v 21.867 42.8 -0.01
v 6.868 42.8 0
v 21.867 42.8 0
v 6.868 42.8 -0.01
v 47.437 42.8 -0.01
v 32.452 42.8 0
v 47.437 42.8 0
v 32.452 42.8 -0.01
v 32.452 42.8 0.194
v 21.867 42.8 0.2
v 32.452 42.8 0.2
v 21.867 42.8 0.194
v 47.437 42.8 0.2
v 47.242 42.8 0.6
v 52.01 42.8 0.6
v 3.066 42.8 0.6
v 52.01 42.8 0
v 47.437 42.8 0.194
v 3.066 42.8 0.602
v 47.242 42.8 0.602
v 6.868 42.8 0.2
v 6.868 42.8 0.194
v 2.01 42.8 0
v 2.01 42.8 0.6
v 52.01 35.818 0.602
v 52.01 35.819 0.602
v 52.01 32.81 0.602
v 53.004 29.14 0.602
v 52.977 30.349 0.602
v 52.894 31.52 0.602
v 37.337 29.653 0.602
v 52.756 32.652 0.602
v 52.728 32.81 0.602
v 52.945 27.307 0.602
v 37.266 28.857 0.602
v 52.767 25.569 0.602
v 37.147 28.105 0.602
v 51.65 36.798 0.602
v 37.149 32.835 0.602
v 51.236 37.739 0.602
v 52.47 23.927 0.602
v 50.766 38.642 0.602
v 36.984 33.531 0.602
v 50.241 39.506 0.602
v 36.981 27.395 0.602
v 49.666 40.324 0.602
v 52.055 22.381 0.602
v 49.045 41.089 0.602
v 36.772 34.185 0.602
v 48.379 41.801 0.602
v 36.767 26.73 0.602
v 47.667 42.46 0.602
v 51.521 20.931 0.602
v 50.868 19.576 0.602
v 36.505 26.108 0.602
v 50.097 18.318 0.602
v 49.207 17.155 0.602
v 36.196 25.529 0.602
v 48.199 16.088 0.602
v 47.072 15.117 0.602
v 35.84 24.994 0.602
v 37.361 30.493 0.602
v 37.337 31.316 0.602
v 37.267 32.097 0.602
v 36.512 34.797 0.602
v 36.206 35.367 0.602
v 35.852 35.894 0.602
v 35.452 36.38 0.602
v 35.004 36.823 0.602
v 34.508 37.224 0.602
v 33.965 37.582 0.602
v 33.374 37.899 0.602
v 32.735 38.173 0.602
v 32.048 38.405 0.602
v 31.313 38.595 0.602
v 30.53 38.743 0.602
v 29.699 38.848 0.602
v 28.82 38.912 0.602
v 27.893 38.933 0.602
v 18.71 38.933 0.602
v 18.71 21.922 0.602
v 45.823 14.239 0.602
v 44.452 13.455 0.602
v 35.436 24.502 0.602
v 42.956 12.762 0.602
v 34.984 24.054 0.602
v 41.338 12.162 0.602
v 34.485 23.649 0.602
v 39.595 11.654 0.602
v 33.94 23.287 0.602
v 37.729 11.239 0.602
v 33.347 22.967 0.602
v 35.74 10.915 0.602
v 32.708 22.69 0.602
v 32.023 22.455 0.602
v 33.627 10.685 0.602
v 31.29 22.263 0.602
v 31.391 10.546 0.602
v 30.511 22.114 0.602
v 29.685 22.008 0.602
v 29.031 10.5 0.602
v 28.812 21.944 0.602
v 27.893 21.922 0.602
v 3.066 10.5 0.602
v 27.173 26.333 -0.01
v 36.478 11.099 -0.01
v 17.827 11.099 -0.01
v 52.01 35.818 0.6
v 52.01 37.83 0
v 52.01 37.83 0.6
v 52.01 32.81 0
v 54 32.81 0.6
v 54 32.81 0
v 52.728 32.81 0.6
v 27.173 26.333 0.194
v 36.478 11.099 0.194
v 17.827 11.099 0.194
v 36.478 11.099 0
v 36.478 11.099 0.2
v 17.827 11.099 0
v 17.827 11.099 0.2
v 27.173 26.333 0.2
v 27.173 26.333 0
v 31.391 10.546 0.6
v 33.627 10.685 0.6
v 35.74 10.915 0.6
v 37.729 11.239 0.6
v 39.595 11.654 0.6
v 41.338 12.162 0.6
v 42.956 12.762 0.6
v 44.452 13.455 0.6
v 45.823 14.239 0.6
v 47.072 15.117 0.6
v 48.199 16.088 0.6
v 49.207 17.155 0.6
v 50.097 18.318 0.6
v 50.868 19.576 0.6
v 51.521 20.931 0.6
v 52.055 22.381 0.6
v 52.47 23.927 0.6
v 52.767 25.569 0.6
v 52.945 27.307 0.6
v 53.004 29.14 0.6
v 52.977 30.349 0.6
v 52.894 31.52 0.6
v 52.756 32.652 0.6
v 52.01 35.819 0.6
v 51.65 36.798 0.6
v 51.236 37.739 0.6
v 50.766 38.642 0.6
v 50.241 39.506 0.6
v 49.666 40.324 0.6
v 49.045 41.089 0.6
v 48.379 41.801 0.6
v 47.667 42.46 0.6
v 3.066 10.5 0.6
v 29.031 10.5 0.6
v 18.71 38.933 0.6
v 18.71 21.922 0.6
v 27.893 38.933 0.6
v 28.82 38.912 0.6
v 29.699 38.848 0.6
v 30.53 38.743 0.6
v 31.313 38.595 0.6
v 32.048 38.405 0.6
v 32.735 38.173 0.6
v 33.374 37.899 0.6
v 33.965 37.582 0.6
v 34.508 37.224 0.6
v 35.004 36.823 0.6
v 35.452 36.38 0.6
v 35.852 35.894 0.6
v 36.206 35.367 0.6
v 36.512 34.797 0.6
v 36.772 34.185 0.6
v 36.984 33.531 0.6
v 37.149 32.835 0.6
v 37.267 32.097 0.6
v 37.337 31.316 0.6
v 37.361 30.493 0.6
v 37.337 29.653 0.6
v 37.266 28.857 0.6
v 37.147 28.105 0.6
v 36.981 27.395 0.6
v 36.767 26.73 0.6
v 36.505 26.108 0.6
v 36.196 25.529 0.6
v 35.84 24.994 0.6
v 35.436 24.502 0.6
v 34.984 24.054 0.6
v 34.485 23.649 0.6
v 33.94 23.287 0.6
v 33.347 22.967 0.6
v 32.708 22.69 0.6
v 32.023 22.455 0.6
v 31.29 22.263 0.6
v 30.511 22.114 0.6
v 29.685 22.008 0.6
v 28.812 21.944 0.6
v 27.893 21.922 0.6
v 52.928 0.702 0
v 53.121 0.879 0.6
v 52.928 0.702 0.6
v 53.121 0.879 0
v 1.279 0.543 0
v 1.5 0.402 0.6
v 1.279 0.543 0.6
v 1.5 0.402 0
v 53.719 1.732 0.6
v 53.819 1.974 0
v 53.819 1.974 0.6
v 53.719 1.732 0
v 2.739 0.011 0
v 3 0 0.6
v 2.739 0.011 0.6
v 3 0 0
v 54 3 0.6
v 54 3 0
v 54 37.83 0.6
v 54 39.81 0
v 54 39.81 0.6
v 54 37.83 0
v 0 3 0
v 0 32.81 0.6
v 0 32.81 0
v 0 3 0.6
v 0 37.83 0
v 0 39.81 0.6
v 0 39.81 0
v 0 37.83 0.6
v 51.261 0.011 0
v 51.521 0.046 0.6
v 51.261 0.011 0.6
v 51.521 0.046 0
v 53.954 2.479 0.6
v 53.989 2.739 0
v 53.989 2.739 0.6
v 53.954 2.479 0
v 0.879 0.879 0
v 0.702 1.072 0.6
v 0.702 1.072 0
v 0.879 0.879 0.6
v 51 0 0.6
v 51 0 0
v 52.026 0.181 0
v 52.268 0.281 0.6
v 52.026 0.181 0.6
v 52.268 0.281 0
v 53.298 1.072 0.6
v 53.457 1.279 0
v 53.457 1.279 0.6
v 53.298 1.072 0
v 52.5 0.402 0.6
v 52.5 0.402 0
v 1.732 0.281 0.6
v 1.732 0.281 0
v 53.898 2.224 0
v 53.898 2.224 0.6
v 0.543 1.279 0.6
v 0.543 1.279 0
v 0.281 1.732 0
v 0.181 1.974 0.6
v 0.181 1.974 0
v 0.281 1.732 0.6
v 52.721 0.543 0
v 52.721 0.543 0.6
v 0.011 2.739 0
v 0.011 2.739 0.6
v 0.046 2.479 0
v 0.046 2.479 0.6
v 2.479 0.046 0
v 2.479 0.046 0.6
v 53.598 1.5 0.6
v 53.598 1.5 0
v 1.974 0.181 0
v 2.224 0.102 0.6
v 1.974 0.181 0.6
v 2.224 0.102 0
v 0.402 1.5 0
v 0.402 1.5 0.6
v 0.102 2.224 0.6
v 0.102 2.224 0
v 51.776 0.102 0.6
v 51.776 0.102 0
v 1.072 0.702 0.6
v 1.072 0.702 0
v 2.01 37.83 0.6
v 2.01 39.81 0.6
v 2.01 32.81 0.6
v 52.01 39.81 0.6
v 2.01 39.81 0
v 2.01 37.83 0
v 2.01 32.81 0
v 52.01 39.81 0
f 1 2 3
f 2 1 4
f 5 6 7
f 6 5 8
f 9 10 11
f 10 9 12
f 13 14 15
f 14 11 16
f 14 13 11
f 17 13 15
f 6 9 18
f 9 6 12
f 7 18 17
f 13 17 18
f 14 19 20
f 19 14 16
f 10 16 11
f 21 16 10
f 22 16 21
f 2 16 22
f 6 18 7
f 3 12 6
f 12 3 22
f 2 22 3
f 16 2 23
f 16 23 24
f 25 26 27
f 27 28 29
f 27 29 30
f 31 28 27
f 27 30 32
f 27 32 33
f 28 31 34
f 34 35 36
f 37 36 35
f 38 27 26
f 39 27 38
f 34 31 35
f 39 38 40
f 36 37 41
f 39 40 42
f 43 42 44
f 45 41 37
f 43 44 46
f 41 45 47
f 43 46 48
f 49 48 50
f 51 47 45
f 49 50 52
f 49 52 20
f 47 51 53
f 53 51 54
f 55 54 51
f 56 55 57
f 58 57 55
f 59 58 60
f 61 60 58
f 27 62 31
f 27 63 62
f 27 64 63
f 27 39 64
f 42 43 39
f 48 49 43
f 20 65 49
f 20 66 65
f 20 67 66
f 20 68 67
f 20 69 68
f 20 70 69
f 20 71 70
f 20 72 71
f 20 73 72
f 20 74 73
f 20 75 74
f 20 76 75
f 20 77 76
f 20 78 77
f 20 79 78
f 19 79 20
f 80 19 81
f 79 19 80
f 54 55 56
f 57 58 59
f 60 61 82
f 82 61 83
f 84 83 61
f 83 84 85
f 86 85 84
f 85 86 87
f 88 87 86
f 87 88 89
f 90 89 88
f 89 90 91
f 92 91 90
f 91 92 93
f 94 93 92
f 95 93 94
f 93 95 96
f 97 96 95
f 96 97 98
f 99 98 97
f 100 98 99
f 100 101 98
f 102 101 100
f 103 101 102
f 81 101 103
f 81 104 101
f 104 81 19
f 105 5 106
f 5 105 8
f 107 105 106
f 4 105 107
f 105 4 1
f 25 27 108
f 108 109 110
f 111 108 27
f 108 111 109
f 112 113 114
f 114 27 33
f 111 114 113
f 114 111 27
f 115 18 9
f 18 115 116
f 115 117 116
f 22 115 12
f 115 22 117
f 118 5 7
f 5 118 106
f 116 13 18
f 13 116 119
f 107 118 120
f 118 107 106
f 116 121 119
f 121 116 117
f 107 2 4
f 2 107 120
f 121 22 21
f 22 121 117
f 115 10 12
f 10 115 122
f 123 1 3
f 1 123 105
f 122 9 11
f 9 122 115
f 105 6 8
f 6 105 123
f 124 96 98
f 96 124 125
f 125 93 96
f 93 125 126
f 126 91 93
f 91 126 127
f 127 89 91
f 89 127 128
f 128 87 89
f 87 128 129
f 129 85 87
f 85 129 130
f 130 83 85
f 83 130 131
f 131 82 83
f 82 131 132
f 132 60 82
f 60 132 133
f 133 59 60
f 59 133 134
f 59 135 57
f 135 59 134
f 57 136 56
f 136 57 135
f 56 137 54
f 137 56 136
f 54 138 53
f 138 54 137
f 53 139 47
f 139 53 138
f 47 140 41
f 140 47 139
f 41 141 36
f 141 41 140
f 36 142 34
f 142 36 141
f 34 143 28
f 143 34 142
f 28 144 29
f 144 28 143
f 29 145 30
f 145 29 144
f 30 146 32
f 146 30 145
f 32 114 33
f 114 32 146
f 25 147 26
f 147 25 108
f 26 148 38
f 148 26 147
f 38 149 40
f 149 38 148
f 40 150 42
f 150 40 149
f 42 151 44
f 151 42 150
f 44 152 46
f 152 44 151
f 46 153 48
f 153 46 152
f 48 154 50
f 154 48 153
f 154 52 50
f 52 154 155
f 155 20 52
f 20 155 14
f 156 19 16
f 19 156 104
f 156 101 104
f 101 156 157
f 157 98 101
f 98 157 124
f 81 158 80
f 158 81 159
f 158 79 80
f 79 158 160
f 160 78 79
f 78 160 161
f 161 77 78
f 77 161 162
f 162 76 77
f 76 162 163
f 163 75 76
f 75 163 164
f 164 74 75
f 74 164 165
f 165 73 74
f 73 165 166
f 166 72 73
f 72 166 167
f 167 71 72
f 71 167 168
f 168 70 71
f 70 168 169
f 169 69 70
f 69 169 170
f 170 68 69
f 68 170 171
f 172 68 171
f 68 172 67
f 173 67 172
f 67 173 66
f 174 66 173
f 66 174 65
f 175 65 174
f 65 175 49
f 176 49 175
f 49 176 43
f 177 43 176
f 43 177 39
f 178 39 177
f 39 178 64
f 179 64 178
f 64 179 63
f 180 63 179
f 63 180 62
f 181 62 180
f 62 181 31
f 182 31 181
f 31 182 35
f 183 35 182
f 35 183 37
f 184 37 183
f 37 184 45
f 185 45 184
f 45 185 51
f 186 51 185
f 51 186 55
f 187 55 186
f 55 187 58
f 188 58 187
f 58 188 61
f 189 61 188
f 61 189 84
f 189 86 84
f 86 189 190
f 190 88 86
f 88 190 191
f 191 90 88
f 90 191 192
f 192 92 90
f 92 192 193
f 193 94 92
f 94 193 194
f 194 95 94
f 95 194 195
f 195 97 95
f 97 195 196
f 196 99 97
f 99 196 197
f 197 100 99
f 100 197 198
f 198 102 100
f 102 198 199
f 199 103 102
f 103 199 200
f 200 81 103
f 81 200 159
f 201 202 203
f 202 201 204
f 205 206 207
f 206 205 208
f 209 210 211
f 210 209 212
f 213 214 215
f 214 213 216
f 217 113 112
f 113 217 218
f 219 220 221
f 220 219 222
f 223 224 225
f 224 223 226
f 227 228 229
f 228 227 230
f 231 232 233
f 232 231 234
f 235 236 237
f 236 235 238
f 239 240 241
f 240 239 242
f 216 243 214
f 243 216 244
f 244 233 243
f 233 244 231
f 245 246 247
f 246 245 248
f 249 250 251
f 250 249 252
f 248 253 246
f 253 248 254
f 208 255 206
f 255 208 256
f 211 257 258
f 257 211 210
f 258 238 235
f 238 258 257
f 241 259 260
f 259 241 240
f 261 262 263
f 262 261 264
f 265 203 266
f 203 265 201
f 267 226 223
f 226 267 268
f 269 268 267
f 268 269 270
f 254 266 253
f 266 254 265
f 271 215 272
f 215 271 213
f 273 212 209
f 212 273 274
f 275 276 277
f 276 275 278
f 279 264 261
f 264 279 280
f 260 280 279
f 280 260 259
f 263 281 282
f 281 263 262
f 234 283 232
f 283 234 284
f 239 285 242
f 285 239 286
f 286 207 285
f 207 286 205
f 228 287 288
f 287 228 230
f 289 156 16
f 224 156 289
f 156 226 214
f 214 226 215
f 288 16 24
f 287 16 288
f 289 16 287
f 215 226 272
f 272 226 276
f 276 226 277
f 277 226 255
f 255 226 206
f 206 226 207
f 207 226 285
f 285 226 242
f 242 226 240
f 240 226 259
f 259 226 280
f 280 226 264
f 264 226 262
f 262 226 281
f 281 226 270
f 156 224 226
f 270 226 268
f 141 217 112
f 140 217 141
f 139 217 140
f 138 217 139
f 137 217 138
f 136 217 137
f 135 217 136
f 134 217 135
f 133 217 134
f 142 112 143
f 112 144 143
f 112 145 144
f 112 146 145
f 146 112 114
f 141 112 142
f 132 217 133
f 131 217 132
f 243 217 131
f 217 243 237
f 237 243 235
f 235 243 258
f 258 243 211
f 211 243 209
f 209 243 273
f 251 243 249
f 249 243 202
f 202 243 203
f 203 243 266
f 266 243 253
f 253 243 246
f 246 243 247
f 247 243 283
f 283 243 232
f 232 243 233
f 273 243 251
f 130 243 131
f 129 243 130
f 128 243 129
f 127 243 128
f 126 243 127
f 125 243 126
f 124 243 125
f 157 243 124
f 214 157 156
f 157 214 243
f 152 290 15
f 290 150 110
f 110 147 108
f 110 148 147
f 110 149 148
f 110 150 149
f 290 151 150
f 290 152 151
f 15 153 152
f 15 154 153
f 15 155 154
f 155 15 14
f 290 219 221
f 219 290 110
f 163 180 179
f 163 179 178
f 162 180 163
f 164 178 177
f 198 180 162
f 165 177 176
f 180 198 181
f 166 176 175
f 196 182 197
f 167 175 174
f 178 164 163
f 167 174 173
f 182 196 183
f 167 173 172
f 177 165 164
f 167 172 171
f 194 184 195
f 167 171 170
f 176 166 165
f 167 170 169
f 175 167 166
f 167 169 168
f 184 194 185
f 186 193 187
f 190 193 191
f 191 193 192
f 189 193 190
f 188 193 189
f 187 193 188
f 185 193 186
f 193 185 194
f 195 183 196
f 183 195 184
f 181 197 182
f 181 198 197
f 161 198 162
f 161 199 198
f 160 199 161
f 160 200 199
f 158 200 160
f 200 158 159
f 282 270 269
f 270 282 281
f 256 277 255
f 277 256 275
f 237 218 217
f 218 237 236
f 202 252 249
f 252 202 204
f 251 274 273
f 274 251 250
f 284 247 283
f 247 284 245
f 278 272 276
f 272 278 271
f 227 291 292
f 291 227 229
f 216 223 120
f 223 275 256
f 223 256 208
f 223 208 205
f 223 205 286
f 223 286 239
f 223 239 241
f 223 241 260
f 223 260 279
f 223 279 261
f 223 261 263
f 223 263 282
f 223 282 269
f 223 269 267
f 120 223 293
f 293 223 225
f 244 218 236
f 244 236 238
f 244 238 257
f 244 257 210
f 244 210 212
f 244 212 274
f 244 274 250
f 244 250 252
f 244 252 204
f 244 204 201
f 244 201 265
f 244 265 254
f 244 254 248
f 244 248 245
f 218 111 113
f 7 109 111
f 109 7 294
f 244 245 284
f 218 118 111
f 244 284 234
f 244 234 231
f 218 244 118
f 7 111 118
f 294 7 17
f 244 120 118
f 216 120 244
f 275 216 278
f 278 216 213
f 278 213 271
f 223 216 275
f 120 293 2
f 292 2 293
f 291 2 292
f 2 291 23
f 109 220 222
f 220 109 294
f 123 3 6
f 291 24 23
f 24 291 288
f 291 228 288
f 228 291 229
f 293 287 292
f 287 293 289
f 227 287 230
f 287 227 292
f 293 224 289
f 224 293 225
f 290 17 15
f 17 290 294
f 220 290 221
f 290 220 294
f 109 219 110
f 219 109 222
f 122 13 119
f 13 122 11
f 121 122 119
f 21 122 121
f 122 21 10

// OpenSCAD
// SplitFlap Generator by Golgarath 2021-06-11 & 2021-06-12
// contributions by ThePseud0o & Smartbert
// Thanks to ProjektionTV & Community

// Model to generate:  
model = "all"; //[card, letter, all, loop]

//letters = "ABCDEFGHIJKLMNOPQRSTUVWXYZ .!?0123456789";
//Letter front side (flap is on top)
letter1 = "A";
//Letter front side (flap is at bottom)
letter2 = "B";

// Font for Letters
font = "Roboto Mono:Bold"; //["Roboto Mono:Bold","Arial Black","Comic Sans MS","Ubuntu Mono"]
//resize factor for letters
//resize factor for letter in X direction
scale_x = 0.7; 
//resize factor for letter in Y direction
scale_y = 0.75;
// Letter Movement on X
move_X = -0.6;
// Letter thickness
letter_thickness = 0.2;
//baseline for Letter
baseline = 10;

// Size of card
//Height of the card in mm
height  = 42.8; 
//Width of the card in mm
width   = 54;
//Thickness of the card in mm
thickness = .6;
 // Corner radius in mm
r = 3;

//coutout width
hinge_width = 2;
// cutout from top
hinge_top = 3; 
// hinge size
hinge = 2; 
//cutout below hinge
hinge_bottom = 5; 

//Distance between flaps
distance = 1; // Smartberts ergänzung

// Flip Card
flip_card = false; //[false, true]

/* [Hidden] */
eps = 0.01;      // epsilon to intersect faces
eps2 = eps * 2;  // epsilon * 2 to intersect faces

//letters for "loop" model
letters = ["9", "A", "B", "C", "D", "E", "F", "G", "H", "I", "J", "K", "L", "M", "N", "O", "P", "Q", "R", "S", "T", "U", "V", "W", "X", "Y", "Z", " ", ".", "!", "?", "0", "1", "2", "3", "4", "5", "6", "7", "8", "9", "A"];
lettercount = 40;

module rcube(size, radius) {
    if(len(radius) == undef) {
        // The same radius on all corners
        rcube(size, [radius, radius, radius, radius]);
    } else if(len(radius) == 2) {
        // Different radii on top and bottom
        rcube(size, [radius[0], radius[0], radius[1], radius[1]]);
    } else if(len(radius) == 4) {
        // Different radius on different corners
        hull() {
            // BL
            if(radius[0] == 0) cube([1, 1, size[2]]);
            else translate([radius[0], radius[0]]) cylinder(r = radius[0], h = size[2]);
            // BR
            if(radius[1] == 0) translate([size[0] - 1, 0]) cube([1, 1, size[2]]);
            else translate([size[0] - radius[1], radius[1]]) cylinder(r = radius[1], h = size[2]);
            // TR
            if(radius[2] == 0) translate([size[0] - 1, size[1] - 1])cube([1, 1, size[2]]);
            else translate([size[0] - radius[2], size[1] - radius[2]]) cylinder(r = radius[2], h = size[2]);
            // TL
            if(radius[3] == 0) translate([0, size[1] - 1]) cube([1, 1, size[2]]);
            else translate([radius[3], size[1] - radius[3]]) cylinder(r = radius[3], h = size[2]);
        }
    } else {
        echo("ERROR: Incorrect length of 'radius' parameter. Expecting integer or vector with length 2 or 4.");
    }
}

module basecard (){
    difference(){
        rcube([width, height, thickness],[r,r,0,0]);
        //TL
        translate([0-eps, height - hinge_top + eps, -eps]) 
            cube([hinge_width + eps2, hinge_top + eps2, thickness + eps2]);
        //BL
        translate([0-eps, height - hinge_top - hinge - hinge_bottom + eps, -eps]) 
            cube([hinge_width + eps2, hinge_bottom + eps2, thickness + eps2]);
        //TR
        translate([width - hinge_width + eps, height - hinge_top + eps, -eps]) 
            cube([hinge_width + eps2, hinge_top + eps2, thickness + eps2]);
        //BR
        translate([width - hinge_width + eps, height - hinge_top - hinge - hinge_bottom + eps, -eps]) 
            cube([hinge_width +eps2, hinge_bottom + eps2, thickness + eps2]);
    }
}

module card(letter1, letter2) {
    difference() {  
        basecard();
        letter(letter1, letter2);        
    }
}

module char (char){
    scale([scale_x, scale_y, 1]) 
        linear_extrude(letter_thickness + eps)        
            text(char, size=(height * 2), halign="center", valign="baseline", font=font);
}

module letter(letter1, letter2) {
     intersection(){ //Letter top
        basecard();        
        rotate([180, 0, 0]) 
            translate ([width/2 + move_X, -(height*2) + baseline - distance / 2, -letter_thickness ]) 
                resize([0, 0, letter_thickness+eps] , auto=[false,false,true]) 
                    char (letter1);
    }
    
    intersection(){ //Letter bottom
        basecard();
        translate ([width/2 + move_X, 0 + baseline + distance / 2, thickness-letter_thickness]) 
            resize([0, 0, letter_thickness + eps], auto=[false,false,true]) 
                char (letter2);
    }
}

if (model=="letter") {
    $fn = $preview ? 12 : 72;
     
    rotate ([flip_card ? 180 : 0, 0, 0]) color ("white") letter(letter1, letter2);
}

if (model=="card") {
    $fn = $preview ? 12 : 72;
    rotate ([flip_card ? 180 : 0, 0, 0]) color ("gray") card(letter1, letter2);
}

if (model=="all") {
    $fn = $preview ? 12 : 72;
    rotate ([flip_card ? 180 : 0, 0, 0]) color ("white") translate ([0, 0, -eps]) scale([1, 1, 1+eps2]) letter(letter1, letter2);
    rotate ([flip_card ? 180 : 0, 0, 0]) color ("gray") card(letter1, letter2);
}

if (model == "loop"){
    $fn = $preview ? 24 : 72;
    for (a=[0:lettercount-1]) {
        
        translate([(width+10)*(a%10), (height*2 + 10+distance) * floor(a / 10), -eps]) 
            color ("white") scale([1, 1, 1+eps2]) letter(letters[a], letters[a+1]);
        translate([(width+10)*(a%10), (height*2 + 10+distance) * floor(a / 10), 0]) 
            color ("gray") basecard();//card(letters[a], letters[a+1]);
        
        rotate([180, 0, 0]) translate([(width+10)*(a%10), -height*2-distance - (height*2 + 10+distance) * floor(a / 10), -thickness -eps]) 
            color ("white") scale([1, 1, 1+eps2]) letter(letters[a+1], letters[a+2]);
        rotate([180, 0, 0]) translate([(width+10)*(a%10),-height*2-distance - (height*2 + 10+distance) * floor(a / 10), -thickness]) 
            color ("gray") basecard();//card(letters[a+1], letters[a+2]);
        
    }
}
